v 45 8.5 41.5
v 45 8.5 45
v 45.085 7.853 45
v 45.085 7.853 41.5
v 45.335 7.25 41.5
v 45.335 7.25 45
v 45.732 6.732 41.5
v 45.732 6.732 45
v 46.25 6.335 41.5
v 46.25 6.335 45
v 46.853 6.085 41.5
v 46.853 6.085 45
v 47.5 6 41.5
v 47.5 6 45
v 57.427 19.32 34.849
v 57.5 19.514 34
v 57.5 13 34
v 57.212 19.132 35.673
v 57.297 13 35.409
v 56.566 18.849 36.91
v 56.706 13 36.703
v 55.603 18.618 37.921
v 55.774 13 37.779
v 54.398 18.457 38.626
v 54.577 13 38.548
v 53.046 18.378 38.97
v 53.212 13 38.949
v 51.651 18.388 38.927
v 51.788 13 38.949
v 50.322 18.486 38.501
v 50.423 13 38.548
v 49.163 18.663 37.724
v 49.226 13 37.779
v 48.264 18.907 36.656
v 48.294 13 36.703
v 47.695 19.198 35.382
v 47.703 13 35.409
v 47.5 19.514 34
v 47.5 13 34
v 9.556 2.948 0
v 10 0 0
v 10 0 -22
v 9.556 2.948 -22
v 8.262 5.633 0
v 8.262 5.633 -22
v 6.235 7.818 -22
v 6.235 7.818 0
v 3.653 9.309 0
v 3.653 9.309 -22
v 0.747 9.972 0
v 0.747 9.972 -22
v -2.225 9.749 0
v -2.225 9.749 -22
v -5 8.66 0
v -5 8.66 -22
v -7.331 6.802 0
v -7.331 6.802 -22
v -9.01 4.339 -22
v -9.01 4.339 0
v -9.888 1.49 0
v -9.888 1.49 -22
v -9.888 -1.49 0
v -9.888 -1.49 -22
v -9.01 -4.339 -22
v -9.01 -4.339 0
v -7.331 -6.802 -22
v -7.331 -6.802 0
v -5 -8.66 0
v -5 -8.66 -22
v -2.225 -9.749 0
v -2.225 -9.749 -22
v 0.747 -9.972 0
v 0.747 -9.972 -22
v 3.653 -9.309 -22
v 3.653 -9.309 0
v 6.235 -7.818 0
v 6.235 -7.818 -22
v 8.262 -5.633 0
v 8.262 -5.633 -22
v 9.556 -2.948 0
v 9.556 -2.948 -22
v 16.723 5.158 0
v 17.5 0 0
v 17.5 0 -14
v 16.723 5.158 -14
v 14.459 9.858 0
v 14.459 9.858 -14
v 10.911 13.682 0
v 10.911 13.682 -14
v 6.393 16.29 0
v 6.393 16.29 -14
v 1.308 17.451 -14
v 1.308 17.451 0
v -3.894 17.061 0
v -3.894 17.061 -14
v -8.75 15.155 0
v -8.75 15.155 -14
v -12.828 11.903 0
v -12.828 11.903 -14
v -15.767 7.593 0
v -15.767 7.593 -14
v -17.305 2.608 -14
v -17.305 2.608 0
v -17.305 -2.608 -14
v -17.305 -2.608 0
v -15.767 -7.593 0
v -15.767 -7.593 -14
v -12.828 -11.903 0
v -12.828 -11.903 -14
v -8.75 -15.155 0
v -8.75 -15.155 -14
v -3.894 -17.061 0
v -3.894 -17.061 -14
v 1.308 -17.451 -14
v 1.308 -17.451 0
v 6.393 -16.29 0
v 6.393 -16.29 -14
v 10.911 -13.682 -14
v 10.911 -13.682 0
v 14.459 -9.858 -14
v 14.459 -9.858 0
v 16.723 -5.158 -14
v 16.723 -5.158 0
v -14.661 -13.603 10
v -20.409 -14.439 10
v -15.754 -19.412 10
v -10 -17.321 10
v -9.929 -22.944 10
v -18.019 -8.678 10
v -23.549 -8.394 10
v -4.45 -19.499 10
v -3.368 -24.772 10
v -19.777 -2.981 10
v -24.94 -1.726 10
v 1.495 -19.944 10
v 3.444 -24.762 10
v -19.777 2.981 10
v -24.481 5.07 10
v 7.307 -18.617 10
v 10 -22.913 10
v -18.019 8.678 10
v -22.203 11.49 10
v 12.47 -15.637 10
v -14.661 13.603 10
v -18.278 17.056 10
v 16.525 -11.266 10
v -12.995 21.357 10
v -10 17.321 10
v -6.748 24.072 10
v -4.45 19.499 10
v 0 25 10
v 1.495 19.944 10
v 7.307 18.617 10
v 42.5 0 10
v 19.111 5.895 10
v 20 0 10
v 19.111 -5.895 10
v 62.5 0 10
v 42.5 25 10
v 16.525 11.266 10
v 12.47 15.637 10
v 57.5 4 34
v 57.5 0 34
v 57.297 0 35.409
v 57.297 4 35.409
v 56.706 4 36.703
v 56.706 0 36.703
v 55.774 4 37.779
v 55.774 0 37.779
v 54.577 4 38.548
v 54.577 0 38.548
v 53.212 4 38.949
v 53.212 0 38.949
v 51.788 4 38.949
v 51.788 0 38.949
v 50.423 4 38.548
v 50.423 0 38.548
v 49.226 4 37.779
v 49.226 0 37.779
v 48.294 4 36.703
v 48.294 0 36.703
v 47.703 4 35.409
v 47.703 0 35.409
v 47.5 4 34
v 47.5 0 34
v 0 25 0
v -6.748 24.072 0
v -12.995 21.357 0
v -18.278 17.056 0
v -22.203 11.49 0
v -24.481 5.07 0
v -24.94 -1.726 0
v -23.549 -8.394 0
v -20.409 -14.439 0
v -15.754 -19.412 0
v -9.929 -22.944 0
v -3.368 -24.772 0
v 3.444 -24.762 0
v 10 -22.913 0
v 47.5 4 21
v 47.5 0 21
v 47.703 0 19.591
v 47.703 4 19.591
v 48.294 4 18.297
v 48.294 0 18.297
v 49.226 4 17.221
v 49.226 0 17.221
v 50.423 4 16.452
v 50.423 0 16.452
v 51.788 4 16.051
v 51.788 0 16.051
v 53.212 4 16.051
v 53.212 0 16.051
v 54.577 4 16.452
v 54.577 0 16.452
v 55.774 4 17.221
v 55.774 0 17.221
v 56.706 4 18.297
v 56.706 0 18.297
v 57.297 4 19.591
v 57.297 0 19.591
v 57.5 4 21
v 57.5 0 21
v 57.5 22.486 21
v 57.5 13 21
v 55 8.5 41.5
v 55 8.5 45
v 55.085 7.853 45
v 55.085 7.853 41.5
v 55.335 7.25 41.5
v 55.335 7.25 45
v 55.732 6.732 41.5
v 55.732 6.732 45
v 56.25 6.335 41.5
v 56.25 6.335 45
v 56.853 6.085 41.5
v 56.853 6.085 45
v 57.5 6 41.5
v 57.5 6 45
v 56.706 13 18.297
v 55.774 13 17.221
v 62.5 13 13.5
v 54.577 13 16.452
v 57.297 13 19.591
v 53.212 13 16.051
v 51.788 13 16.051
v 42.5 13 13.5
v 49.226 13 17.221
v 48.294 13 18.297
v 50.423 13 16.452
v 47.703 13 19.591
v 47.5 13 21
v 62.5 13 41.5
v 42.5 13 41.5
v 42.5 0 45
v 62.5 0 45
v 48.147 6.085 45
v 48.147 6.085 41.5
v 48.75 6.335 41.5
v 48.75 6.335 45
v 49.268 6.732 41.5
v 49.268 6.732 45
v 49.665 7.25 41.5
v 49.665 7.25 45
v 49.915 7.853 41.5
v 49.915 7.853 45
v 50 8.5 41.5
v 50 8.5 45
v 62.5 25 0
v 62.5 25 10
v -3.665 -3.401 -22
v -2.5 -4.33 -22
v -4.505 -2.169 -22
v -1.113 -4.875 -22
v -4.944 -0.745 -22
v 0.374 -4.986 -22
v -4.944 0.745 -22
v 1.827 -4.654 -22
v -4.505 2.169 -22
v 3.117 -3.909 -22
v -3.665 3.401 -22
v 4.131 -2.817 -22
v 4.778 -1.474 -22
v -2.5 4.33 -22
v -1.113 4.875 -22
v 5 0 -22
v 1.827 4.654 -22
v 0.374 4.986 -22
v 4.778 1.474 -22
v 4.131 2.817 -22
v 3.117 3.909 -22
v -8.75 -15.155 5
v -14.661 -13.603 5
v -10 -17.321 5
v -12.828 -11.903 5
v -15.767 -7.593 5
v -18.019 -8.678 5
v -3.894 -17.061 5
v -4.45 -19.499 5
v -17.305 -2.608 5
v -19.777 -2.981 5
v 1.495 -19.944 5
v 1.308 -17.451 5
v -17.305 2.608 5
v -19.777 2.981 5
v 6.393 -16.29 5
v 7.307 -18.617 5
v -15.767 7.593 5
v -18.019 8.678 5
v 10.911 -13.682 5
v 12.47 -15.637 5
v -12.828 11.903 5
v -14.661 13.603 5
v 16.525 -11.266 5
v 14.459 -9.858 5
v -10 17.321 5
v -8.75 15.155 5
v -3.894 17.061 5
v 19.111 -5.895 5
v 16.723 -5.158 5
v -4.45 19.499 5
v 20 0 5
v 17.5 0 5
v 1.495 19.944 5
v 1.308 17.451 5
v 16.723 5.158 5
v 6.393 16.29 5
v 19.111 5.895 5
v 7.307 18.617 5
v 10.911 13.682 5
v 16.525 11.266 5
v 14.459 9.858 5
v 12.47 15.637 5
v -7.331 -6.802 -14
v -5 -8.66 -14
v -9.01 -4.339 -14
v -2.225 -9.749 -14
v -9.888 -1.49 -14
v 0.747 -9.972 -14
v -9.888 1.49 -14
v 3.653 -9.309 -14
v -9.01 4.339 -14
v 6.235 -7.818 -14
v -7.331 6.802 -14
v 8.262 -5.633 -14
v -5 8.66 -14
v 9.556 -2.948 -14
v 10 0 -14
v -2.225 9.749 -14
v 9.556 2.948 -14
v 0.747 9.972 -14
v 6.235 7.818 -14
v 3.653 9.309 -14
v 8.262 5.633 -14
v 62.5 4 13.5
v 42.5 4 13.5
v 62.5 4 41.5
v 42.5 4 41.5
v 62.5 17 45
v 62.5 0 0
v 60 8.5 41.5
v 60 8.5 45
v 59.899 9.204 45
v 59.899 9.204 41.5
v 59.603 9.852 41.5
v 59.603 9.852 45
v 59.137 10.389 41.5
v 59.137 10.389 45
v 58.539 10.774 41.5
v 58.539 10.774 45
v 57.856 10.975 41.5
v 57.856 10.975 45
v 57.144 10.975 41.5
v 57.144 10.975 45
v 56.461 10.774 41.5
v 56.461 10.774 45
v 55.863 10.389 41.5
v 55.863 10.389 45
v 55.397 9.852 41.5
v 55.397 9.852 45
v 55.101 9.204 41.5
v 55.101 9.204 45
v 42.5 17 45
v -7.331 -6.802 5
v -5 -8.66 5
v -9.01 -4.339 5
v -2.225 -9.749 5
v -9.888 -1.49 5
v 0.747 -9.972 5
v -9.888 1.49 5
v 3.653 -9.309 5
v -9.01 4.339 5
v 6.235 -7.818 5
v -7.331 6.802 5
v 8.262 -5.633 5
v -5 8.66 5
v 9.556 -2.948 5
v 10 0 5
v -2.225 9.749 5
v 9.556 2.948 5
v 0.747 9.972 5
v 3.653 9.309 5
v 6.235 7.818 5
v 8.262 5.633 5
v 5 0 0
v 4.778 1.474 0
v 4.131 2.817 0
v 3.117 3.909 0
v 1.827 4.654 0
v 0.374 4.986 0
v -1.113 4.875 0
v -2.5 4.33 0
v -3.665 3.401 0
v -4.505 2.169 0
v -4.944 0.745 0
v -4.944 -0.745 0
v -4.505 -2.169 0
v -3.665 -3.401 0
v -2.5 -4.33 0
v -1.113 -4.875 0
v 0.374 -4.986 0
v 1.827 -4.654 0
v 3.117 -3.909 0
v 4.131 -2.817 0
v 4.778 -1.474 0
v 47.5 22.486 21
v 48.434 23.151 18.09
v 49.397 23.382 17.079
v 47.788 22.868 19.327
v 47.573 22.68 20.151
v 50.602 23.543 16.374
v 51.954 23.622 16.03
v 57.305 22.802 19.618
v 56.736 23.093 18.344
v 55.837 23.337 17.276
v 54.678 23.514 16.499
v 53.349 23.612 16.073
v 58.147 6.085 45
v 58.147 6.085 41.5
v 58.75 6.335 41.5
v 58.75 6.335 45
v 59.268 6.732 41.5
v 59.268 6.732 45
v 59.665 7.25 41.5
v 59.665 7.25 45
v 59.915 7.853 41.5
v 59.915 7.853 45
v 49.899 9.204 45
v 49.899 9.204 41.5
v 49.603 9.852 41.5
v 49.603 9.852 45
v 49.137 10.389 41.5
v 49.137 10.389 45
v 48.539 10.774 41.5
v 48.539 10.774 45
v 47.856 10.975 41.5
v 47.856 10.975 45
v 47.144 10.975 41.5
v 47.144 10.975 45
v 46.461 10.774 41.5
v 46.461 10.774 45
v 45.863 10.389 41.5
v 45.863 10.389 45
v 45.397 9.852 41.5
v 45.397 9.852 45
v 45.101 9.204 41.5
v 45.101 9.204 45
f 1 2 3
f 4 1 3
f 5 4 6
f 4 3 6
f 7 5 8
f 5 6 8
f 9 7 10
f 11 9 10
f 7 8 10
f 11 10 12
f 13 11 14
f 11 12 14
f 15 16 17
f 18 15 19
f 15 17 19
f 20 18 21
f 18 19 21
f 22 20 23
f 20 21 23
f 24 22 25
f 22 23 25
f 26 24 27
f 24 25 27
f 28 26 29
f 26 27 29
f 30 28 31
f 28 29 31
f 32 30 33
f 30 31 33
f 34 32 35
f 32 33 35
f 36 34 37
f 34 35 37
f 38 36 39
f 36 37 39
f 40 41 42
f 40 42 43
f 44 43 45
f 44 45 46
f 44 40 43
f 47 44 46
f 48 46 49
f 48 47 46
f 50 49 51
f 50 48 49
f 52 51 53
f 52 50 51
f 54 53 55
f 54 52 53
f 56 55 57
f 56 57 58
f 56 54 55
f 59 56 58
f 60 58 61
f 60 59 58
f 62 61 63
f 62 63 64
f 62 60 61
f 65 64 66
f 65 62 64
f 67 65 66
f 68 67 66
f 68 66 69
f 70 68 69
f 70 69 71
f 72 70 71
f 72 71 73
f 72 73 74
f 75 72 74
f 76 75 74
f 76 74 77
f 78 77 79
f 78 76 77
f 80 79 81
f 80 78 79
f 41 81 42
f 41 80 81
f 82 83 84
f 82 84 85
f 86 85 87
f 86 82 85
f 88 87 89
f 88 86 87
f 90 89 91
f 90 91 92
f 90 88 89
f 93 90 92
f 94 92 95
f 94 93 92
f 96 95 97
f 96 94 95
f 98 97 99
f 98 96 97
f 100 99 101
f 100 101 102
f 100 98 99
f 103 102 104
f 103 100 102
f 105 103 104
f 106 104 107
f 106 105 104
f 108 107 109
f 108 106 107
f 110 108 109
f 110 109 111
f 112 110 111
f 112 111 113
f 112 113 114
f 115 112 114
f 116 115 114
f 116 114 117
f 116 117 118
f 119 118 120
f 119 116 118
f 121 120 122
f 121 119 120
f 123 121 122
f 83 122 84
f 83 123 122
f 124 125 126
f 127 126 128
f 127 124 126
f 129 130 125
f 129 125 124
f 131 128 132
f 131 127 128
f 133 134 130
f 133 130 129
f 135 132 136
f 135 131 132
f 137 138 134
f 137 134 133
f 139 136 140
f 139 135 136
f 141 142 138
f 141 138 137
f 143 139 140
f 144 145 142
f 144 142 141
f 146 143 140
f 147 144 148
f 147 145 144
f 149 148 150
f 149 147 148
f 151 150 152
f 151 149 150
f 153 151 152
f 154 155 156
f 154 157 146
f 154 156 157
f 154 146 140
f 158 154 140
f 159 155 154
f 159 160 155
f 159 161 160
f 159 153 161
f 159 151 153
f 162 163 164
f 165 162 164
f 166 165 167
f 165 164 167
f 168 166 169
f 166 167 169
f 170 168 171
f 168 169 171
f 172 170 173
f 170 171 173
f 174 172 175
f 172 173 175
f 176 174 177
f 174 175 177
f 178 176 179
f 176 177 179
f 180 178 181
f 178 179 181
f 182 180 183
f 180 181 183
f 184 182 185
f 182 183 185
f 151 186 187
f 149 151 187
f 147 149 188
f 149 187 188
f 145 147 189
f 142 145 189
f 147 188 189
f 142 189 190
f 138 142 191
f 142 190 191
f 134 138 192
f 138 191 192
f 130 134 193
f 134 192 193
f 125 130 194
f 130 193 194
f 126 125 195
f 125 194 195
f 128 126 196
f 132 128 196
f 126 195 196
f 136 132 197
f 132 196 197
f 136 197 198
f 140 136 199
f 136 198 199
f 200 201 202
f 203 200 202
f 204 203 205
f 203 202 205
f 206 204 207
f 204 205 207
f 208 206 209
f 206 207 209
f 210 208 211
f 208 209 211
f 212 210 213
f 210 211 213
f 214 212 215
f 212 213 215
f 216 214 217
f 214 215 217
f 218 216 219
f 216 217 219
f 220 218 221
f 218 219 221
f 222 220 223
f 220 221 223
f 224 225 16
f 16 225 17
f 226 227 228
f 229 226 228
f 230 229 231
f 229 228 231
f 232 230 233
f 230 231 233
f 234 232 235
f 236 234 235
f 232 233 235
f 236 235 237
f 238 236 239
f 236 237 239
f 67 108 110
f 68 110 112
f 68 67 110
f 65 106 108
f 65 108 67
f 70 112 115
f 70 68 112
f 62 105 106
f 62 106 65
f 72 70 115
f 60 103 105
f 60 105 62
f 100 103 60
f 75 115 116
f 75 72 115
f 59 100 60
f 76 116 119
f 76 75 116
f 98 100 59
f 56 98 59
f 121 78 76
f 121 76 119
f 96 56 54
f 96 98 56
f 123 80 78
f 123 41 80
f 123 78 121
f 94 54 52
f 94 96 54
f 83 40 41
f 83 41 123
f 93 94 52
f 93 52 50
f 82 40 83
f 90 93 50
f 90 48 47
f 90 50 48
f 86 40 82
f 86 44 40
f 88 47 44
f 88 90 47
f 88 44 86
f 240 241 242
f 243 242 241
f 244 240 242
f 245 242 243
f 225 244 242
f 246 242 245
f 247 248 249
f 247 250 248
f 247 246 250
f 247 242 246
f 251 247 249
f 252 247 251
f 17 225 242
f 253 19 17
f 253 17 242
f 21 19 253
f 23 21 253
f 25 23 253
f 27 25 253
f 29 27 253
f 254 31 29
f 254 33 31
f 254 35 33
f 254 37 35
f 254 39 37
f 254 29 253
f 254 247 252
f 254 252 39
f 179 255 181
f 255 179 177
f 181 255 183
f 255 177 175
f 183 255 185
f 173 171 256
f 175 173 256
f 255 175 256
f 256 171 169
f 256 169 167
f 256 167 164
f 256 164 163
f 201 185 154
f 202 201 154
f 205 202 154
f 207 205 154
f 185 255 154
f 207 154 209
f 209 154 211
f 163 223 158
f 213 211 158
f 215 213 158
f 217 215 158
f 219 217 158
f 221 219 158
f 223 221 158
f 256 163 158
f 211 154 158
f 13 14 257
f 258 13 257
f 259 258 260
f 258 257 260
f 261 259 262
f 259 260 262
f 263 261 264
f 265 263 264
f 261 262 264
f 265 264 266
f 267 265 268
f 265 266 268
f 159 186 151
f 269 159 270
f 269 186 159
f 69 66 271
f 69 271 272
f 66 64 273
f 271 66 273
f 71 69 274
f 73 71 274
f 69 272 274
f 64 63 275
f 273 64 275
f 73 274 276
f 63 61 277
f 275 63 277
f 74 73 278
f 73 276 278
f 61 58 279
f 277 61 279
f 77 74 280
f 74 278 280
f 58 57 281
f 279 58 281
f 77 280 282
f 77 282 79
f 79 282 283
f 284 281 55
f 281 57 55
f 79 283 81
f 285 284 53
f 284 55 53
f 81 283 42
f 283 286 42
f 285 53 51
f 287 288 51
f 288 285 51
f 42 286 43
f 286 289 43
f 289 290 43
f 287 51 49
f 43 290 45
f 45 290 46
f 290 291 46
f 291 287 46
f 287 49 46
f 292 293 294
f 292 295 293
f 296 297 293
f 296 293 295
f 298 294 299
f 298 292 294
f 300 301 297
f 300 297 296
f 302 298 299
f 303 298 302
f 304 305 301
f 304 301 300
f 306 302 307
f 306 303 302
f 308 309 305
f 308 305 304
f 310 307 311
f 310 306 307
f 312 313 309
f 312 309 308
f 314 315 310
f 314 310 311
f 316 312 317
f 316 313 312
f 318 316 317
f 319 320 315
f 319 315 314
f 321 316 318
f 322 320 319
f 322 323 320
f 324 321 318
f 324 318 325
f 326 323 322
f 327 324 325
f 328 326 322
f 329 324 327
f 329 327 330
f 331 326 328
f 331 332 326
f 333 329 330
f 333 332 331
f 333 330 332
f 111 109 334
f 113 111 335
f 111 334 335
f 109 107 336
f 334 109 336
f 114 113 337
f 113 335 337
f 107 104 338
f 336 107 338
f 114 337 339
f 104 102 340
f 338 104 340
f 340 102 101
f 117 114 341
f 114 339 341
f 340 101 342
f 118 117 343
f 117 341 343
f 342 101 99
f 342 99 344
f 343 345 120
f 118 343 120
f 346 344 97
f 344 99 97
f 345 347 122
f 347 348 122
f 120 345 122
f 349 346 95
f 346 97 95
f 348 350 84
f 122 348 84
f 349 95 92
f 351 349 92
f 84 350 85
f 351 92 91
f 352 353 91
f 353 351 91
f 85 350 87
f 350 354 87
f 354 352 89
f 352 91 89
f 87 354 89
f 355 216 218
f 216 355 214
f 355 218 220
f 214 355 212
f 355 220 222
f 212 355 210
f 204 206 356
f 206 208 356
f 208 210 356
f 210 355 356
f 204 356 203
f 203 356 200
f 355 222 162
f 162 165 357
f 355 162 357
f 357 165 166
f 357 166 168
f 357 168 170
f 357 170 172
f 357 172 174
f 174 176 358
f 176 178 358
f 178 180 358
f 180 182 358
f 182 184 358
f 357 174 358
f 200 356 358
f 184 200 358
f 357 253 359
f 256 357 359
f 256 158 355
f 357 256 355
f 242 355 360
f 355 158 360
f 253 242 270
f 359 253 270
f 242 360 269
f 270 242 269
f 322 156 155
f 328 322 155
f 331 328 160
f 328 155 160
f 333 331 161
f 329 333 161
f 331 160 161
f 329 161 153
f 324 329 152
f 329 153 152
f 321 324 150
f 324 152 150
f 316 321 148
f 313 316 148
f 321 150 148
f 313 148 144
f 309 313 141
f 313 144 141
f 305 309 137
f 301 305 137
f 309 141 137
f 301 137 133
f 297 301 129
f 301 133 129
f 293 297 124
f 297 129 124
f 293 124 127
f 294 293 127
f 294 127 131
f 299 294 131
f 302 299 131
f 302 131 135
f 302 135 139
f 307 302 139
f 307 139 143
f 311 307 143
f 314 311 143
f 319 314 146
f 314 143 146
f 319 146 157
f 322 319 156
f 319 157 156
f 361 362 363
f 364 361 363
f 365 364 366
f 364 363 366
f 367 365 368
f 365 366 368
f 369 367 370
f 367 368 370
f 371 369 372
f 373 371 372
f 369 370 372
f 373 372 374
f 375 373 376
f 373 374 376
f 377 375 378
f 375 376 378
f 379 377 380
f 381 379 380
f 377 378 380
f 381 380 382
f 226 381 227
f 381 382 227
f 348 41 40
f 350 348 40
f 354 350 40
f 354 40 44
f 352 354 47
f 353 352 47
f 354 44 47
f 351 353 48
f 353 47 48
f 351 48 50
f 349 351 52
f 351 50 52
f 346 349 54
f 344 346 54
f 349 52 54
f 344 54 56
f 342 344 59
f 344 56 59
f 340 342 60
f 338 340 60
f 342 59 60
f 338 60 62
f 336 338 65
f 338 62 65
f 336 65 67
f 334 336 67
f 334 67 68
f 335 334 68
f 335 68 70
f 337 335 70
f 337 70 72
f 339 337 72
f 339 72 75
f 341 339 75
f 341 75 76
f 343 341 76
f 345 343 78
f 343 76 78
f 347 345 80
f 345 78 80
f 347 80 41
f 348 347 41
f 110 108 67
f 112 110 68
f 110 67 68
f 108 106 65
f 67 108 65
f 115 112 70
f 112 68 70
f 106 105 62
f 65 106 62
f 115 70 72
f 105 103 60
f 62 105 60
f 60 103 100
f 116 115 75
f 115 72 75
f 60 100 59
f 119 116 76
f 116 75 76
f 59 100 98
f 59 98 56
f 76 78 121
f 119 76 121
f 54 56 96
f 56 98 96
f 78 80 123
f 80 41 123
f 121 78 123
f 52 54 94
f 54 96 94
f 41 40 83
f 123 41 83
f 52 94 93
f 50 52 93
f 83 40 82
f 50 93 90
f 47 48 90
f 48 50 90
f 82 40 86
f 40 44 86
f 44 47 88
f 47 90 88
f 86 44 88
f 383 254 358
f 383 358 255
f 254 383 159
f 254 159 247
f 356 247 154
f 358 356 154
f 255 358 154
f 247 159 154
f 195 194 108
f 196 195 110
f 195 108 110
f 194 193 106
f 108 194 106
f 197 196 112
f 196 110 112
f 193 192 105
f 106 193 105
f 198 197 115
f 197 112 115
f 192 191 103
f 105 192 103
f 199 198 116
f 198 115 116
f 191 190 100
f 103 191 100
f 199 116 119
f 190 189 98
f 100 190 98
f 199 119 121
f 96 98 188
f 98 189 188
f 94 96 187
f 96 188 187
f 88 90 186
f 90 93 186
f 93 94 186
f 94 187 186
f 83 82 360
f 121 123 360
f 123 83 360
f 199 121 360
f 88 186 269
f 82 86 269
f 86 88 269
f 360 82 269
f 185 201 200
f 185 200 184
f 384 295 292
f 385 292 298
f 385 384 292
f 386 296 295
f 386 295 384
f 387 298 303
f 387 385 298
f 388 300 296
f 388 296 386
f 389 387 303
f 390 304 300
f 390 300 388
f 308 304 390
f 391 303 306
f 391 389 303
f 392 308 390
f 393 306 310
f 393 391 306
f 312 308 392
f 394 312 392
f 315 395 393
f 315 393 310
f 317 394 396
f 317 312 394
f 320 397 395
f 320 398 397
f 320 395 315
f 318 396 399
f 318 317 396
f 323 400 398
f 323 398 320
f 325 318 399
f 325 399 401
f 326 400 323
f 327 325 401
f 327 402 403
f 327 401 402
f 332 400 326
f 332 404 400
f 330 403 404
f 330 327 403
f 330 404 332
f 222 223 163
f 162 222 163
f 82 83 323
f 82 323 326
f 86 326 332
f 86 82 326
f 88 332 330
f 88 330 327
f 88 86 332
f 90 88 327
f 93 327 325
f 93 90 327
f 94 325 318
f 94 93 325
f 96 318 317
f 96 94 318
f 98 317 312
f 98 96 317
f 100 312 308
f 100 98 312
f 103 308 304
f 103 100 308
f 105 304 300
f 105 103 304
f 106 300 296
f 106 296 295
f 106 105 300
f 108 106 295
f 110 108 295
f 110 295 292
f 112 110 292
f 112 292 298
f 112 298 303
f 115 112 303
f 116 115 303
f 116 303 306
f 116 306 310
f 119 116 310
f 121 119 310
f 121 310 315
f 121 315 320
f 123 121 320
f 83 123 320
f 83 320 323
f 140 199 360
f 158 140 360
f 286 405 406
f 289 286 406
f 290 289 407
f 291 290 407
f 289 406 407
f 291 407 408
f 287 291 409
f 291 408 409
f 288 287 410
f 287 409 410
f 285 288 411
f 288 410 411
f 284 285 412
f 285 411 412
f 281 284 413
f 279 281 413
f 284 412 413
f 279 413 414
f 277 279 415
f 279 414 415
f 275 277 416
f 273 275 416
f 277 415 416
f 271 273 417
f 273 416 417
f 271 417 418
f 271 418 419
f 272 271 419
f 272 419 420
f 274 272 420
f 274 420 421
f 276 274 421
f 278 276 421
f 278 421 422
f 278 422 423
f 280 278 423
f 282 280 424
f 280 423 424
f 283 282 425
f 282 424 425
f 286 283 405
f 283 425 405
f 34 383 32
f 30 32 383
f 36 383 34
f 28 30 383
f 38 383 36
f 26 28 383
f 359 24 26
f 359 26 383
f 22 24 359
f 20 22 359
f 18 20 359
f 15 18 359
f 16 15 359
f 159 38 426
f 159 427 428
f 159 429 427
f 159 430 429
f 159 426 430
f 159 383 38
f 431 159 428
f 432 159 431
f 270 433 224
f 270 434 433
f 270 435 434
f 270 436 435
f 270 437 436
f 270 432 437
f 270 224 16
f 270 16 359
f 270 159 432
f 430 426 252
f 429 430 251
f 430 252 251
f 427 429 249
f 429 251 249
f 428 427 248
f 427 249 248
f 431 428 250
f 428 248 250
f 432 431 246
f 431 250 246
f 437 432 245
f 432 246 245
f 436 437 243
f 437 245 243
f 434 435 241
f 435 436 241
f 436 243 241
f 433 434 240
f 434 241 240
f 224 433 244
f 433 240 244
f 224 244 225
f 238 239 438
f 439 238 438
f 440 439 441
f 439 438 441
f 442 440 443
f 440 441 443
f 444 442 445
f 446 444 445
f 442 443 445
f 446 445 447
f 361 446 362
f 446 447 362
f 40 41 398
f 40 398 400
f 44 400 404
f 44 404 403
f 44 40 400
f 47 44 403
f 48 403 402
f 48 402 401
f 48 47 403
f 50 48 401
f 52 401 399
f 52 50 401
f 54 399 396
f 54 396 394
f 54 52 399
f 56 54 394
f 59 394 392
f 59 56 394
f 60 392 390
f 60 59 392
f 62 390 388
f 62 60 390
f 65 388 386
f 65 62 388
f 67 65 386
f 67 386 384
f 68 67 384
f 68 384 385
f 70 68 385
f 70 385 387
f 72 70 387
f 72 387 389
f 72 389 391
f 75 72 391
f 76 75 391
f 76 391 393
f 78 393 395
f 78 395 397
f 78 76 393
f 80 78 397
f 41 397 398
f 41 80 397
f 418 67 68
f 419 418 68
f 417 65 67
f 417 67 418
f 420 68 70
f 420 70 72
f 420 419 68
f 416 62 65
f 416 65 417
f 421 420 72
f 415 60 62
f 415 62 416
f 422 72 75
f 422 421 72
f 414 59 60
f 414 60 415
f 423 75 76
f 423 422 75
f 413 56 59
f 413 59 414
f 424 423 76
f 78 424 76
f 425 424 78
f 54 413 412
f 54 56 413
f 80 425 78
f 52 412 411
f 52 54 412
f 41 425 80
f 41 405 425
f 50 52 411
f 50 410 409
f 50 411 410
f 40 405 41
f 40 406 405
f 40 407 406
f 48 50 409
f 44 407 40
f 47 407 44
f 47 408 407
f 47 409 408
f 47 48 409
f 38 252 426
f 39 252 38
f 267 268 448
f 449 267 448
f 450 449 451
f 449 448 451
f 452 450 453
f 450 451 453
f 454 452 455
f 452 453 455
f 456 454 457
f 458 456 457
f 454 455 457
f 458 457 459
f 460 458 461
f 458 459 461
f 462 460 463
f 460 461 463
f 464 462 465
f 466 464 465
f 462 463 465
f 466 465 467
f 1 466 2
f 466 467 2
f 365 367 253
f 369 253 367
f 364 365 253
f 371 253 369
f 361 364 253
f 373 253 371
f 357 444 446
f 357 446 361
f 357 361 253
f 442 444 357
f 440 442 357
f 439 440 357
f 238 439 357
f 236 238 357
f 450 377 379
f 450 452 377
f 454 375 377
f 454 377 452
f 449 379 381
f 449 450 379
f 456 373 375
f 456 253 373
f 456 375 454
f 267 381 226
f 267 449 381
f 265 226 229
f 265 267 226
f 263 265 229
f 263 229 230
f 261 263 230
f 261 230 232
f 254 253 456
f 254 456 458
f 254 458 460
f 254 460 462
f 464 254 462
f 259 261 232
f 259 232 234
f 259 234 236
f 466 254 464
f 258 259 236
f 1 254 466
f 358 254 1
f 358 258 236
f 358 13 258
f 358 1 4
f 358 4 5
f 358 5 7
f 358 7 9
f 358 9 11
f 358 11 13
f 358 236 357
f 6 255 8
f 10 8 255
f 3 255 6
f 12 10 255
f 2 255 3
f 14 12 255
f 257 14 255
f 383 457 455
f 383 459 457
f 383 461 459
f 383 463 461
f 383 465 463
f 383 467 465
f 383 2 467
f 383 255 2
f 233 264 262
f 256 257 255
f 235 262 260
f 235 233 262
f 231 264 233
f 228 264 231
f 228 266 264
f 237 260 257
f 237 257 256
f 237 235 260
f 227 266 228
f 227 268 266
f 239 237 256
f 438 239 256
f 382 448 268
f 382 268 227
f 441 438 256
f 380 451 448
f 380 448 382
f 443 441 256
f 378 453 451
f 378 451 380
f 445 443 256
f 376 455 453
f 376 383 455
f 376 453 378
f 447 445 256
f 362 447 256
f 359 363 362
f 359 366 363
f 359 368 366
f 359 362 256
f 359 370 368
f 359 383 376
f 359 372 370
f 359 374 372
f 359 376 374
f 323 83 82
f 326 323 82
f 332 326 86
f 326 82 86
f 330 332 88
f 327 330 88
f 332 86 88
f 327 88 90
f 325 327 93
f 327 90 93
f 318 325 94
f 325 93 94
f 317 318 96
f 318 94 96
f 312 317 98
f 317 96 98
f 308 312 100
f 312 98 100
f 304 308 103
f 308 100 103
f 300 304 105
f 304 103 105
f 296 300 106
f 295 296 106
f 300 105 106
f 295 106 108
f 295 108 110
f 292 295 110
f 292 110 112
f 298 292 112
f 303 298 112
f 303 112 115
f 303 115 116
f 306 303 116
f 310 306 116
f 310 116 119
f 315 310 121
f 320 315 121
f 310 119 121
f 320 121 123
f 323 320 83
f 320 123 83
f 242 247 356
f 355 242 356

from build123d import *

# Parameters (mm, degrees)
F0_R      = 20
F0_R_2    = 17.5
F1_DEPTH  = 10
F0_W      = 20
F0_H      = 8
F0_H_2    = 17
F2_DEPTH  = 45
F0_R_3    = 10
F0_R_4    = 5
F3_DEPTH  = 22
F5_SIZE2  = 35
F5_SIZE   = 8
F6_W      = 9
F6_H      = 28
F7_DEPTH  = 30
F8_W      = 10
F8_H      = 13
F9_DEPTH  = 26
F10_DEPTH = 25
F11_R     = 20
F11_R_2   = 17.5
F12_DEPTH = 5
F13_DEPTH = 14
F14_DEPTH = 5


with BuildPart() as f1:
    # F0 (on Top) → F1 (new body)
    with BuildSketch(Plane.XY):
        with BuildLine():
            Line((42.5, 25), (0, 25))
            ThreePointArc((0, 25), (-24.4726578233, -5.1077410922), (10, -22.9128784748))
            Line((10, -22.9128784748), (62.5, 0))
            Line((62.5, 0), (42.5, 0))
            Line((42.5, 0), (42.5, 17))
            Line((42.5, 17), (42.5, 25))
        make_face()
        Circle(F0_R, mode=Mode.SUBTRACT)
        Circle(F0_R)
        Circle(F0_R_2, mode=Mode.SUBTRACT)
    extrude(amount=F1_DEPTH)

    # F0 (on Top) → F2 (join)
    with BuildSketch(Plane.XY):
        with Locations((52.5, 21)):
            Rectangle(F0_W, F0_H)
        with Locations((52.5, 8.5)):
            Rectangle(F0_W, F0_H_2)
    extrude(amount=F2_DEPTH)

    # F5
    f5_edges = [f1.edges().sort_by_distance(p)[0] for p in [
        (52.5, 25, 45),
    ]]
    f5_side = f1.faces().sort_by_distance((52.5, 12.5, 45))[0]
    chamfer(f5_edges, length=F5_SIZE, length2=F5_SIZE2, reference=f5_side)

    # F6 (on face) → F7 (cut)
    with BuildSketch(Plane(origin=(42.5, 0, 0), x_dir=(0, -1, 0), z_dir=(-1, 0, 0))):
        with Locations((-8.5, 27.5)):
            Rectangle(F6_W, F6_H)
    extrude(amount=-F7_DEPTH, mode=Mode.SUBTRACT)

    # F8 (on face) → F9 (cut)
    with BuildSketch(Plane.XZ):
        with BuildLine():
            Line((47.5, 34), (57.5, 34))
            ThreePointArc((57.5, 34), (52.5, 39), (47.5, 34))
        make_face()
        with Locations((52.5, 27.5)):
            Rectangle(F8_W, F8_H)
        with BuildLine():
            ThreePointArc((47.5, 21), (52.5, 16), (57.5, 21))
            Line((57.5, 21), (47.5, 21))
        make_face()
    extrude(amount=-F9_DEPTH, mode=Mode.SUBTRACT)

    # F4 (on face) → F10 (cut)
    with BuildSketch(Plane.XY.offset(45)):
        with BuildLine():
            Line((47.5, 8.5), (50, 8.5))
            ThreePointArc((50, 8.5), (47.5, 11), (45, 8.5))
            Line((45, 8.5), (47.5, 8.5))
        make_face()
        with BuildLine():
            ThreePointArc((45, 8.5), (45.732233047, 6.732233047), (47.5, 6))
            Line((47.5, 6), (47.5, 8.5))
            Line((47.5, 8.5), (45, 8.5))
        make_face()
        with BuildLine():
            Line((47.5, 8.5), (47.5, 6))
            ThreePointArc((47.5, 6), (49.267766953, 6.732233047), (50, 8.5))
            Line((50, 8.5), (47.5, 8.5))
        make_face()
        with BuildLine():
            Line((57.5, 8.5), (60, 8.5))
            ThreePointArc((60, 8.5), (57.5, 11), (55, 8.5))
            Line((55, 8.5), (57.5, 8.5))
        make_face()
        with BuildLine():
            ThreePointArc((55, 8.5), (55.732233047, 6.732233047), (57.5, 6))
            Line((57.5, 6), (57.5, 8.5))
            Line((57.5, 8.5), (55, 8.5))
        make_face()
        with BuildLine():
            ThreePointArc((57.5, 6), (59.267766953, 6.732233047), (60, 8.5))
            Line((60, 8.5), (57.5, 8.5))
            Line((57.5, 8.5), (57.5, 6))
        make_face()
    extrude(amount=-F10_DEPTH, mode=Mode.SUBTRACT)

    # F11 (on face) → F12 (cut)
    with BuildSketch(Plane.XY.offset(10)):
        Circle(F11_R)
        Circle(F11_R_2, mode=Mode.SUBTRACT)
    extrude(amount=-F12_DEPTH, mode=Mode.SUBTRACT)


with BuildPart() as f3:
    # F0 (on Top) → F3 (new body)
    with BuildSketch(Plane.XY):
        Circle(F0_R_3)
        Circle(F0_R_4, mode=Mode.SUBTRACT)
    extrude(amount=-F3_DEPTH)


with BuildPart() as f13:
    # F0 (on Top) → F13 (new body)
    with BuildSketch(Plane.XY):
        Circle(F0_R_2)
        Circle(F0_R_3, mode=Mode.SUBTRACT)
    extrude(amount=-F13_DEPTH)


with BuildPart() as f14:
    # F0 (on Top) → F14 (new body)
    with BuildSketch(Plane.XY):
        Circle(F0_R_2)
        Circle(F0_R_3, mode=Mode.SUBTRACT)
    extrude(amount=F14_DEPTH)


solid = Compound([f1.part, f3.part, f13.part, f14.part])
